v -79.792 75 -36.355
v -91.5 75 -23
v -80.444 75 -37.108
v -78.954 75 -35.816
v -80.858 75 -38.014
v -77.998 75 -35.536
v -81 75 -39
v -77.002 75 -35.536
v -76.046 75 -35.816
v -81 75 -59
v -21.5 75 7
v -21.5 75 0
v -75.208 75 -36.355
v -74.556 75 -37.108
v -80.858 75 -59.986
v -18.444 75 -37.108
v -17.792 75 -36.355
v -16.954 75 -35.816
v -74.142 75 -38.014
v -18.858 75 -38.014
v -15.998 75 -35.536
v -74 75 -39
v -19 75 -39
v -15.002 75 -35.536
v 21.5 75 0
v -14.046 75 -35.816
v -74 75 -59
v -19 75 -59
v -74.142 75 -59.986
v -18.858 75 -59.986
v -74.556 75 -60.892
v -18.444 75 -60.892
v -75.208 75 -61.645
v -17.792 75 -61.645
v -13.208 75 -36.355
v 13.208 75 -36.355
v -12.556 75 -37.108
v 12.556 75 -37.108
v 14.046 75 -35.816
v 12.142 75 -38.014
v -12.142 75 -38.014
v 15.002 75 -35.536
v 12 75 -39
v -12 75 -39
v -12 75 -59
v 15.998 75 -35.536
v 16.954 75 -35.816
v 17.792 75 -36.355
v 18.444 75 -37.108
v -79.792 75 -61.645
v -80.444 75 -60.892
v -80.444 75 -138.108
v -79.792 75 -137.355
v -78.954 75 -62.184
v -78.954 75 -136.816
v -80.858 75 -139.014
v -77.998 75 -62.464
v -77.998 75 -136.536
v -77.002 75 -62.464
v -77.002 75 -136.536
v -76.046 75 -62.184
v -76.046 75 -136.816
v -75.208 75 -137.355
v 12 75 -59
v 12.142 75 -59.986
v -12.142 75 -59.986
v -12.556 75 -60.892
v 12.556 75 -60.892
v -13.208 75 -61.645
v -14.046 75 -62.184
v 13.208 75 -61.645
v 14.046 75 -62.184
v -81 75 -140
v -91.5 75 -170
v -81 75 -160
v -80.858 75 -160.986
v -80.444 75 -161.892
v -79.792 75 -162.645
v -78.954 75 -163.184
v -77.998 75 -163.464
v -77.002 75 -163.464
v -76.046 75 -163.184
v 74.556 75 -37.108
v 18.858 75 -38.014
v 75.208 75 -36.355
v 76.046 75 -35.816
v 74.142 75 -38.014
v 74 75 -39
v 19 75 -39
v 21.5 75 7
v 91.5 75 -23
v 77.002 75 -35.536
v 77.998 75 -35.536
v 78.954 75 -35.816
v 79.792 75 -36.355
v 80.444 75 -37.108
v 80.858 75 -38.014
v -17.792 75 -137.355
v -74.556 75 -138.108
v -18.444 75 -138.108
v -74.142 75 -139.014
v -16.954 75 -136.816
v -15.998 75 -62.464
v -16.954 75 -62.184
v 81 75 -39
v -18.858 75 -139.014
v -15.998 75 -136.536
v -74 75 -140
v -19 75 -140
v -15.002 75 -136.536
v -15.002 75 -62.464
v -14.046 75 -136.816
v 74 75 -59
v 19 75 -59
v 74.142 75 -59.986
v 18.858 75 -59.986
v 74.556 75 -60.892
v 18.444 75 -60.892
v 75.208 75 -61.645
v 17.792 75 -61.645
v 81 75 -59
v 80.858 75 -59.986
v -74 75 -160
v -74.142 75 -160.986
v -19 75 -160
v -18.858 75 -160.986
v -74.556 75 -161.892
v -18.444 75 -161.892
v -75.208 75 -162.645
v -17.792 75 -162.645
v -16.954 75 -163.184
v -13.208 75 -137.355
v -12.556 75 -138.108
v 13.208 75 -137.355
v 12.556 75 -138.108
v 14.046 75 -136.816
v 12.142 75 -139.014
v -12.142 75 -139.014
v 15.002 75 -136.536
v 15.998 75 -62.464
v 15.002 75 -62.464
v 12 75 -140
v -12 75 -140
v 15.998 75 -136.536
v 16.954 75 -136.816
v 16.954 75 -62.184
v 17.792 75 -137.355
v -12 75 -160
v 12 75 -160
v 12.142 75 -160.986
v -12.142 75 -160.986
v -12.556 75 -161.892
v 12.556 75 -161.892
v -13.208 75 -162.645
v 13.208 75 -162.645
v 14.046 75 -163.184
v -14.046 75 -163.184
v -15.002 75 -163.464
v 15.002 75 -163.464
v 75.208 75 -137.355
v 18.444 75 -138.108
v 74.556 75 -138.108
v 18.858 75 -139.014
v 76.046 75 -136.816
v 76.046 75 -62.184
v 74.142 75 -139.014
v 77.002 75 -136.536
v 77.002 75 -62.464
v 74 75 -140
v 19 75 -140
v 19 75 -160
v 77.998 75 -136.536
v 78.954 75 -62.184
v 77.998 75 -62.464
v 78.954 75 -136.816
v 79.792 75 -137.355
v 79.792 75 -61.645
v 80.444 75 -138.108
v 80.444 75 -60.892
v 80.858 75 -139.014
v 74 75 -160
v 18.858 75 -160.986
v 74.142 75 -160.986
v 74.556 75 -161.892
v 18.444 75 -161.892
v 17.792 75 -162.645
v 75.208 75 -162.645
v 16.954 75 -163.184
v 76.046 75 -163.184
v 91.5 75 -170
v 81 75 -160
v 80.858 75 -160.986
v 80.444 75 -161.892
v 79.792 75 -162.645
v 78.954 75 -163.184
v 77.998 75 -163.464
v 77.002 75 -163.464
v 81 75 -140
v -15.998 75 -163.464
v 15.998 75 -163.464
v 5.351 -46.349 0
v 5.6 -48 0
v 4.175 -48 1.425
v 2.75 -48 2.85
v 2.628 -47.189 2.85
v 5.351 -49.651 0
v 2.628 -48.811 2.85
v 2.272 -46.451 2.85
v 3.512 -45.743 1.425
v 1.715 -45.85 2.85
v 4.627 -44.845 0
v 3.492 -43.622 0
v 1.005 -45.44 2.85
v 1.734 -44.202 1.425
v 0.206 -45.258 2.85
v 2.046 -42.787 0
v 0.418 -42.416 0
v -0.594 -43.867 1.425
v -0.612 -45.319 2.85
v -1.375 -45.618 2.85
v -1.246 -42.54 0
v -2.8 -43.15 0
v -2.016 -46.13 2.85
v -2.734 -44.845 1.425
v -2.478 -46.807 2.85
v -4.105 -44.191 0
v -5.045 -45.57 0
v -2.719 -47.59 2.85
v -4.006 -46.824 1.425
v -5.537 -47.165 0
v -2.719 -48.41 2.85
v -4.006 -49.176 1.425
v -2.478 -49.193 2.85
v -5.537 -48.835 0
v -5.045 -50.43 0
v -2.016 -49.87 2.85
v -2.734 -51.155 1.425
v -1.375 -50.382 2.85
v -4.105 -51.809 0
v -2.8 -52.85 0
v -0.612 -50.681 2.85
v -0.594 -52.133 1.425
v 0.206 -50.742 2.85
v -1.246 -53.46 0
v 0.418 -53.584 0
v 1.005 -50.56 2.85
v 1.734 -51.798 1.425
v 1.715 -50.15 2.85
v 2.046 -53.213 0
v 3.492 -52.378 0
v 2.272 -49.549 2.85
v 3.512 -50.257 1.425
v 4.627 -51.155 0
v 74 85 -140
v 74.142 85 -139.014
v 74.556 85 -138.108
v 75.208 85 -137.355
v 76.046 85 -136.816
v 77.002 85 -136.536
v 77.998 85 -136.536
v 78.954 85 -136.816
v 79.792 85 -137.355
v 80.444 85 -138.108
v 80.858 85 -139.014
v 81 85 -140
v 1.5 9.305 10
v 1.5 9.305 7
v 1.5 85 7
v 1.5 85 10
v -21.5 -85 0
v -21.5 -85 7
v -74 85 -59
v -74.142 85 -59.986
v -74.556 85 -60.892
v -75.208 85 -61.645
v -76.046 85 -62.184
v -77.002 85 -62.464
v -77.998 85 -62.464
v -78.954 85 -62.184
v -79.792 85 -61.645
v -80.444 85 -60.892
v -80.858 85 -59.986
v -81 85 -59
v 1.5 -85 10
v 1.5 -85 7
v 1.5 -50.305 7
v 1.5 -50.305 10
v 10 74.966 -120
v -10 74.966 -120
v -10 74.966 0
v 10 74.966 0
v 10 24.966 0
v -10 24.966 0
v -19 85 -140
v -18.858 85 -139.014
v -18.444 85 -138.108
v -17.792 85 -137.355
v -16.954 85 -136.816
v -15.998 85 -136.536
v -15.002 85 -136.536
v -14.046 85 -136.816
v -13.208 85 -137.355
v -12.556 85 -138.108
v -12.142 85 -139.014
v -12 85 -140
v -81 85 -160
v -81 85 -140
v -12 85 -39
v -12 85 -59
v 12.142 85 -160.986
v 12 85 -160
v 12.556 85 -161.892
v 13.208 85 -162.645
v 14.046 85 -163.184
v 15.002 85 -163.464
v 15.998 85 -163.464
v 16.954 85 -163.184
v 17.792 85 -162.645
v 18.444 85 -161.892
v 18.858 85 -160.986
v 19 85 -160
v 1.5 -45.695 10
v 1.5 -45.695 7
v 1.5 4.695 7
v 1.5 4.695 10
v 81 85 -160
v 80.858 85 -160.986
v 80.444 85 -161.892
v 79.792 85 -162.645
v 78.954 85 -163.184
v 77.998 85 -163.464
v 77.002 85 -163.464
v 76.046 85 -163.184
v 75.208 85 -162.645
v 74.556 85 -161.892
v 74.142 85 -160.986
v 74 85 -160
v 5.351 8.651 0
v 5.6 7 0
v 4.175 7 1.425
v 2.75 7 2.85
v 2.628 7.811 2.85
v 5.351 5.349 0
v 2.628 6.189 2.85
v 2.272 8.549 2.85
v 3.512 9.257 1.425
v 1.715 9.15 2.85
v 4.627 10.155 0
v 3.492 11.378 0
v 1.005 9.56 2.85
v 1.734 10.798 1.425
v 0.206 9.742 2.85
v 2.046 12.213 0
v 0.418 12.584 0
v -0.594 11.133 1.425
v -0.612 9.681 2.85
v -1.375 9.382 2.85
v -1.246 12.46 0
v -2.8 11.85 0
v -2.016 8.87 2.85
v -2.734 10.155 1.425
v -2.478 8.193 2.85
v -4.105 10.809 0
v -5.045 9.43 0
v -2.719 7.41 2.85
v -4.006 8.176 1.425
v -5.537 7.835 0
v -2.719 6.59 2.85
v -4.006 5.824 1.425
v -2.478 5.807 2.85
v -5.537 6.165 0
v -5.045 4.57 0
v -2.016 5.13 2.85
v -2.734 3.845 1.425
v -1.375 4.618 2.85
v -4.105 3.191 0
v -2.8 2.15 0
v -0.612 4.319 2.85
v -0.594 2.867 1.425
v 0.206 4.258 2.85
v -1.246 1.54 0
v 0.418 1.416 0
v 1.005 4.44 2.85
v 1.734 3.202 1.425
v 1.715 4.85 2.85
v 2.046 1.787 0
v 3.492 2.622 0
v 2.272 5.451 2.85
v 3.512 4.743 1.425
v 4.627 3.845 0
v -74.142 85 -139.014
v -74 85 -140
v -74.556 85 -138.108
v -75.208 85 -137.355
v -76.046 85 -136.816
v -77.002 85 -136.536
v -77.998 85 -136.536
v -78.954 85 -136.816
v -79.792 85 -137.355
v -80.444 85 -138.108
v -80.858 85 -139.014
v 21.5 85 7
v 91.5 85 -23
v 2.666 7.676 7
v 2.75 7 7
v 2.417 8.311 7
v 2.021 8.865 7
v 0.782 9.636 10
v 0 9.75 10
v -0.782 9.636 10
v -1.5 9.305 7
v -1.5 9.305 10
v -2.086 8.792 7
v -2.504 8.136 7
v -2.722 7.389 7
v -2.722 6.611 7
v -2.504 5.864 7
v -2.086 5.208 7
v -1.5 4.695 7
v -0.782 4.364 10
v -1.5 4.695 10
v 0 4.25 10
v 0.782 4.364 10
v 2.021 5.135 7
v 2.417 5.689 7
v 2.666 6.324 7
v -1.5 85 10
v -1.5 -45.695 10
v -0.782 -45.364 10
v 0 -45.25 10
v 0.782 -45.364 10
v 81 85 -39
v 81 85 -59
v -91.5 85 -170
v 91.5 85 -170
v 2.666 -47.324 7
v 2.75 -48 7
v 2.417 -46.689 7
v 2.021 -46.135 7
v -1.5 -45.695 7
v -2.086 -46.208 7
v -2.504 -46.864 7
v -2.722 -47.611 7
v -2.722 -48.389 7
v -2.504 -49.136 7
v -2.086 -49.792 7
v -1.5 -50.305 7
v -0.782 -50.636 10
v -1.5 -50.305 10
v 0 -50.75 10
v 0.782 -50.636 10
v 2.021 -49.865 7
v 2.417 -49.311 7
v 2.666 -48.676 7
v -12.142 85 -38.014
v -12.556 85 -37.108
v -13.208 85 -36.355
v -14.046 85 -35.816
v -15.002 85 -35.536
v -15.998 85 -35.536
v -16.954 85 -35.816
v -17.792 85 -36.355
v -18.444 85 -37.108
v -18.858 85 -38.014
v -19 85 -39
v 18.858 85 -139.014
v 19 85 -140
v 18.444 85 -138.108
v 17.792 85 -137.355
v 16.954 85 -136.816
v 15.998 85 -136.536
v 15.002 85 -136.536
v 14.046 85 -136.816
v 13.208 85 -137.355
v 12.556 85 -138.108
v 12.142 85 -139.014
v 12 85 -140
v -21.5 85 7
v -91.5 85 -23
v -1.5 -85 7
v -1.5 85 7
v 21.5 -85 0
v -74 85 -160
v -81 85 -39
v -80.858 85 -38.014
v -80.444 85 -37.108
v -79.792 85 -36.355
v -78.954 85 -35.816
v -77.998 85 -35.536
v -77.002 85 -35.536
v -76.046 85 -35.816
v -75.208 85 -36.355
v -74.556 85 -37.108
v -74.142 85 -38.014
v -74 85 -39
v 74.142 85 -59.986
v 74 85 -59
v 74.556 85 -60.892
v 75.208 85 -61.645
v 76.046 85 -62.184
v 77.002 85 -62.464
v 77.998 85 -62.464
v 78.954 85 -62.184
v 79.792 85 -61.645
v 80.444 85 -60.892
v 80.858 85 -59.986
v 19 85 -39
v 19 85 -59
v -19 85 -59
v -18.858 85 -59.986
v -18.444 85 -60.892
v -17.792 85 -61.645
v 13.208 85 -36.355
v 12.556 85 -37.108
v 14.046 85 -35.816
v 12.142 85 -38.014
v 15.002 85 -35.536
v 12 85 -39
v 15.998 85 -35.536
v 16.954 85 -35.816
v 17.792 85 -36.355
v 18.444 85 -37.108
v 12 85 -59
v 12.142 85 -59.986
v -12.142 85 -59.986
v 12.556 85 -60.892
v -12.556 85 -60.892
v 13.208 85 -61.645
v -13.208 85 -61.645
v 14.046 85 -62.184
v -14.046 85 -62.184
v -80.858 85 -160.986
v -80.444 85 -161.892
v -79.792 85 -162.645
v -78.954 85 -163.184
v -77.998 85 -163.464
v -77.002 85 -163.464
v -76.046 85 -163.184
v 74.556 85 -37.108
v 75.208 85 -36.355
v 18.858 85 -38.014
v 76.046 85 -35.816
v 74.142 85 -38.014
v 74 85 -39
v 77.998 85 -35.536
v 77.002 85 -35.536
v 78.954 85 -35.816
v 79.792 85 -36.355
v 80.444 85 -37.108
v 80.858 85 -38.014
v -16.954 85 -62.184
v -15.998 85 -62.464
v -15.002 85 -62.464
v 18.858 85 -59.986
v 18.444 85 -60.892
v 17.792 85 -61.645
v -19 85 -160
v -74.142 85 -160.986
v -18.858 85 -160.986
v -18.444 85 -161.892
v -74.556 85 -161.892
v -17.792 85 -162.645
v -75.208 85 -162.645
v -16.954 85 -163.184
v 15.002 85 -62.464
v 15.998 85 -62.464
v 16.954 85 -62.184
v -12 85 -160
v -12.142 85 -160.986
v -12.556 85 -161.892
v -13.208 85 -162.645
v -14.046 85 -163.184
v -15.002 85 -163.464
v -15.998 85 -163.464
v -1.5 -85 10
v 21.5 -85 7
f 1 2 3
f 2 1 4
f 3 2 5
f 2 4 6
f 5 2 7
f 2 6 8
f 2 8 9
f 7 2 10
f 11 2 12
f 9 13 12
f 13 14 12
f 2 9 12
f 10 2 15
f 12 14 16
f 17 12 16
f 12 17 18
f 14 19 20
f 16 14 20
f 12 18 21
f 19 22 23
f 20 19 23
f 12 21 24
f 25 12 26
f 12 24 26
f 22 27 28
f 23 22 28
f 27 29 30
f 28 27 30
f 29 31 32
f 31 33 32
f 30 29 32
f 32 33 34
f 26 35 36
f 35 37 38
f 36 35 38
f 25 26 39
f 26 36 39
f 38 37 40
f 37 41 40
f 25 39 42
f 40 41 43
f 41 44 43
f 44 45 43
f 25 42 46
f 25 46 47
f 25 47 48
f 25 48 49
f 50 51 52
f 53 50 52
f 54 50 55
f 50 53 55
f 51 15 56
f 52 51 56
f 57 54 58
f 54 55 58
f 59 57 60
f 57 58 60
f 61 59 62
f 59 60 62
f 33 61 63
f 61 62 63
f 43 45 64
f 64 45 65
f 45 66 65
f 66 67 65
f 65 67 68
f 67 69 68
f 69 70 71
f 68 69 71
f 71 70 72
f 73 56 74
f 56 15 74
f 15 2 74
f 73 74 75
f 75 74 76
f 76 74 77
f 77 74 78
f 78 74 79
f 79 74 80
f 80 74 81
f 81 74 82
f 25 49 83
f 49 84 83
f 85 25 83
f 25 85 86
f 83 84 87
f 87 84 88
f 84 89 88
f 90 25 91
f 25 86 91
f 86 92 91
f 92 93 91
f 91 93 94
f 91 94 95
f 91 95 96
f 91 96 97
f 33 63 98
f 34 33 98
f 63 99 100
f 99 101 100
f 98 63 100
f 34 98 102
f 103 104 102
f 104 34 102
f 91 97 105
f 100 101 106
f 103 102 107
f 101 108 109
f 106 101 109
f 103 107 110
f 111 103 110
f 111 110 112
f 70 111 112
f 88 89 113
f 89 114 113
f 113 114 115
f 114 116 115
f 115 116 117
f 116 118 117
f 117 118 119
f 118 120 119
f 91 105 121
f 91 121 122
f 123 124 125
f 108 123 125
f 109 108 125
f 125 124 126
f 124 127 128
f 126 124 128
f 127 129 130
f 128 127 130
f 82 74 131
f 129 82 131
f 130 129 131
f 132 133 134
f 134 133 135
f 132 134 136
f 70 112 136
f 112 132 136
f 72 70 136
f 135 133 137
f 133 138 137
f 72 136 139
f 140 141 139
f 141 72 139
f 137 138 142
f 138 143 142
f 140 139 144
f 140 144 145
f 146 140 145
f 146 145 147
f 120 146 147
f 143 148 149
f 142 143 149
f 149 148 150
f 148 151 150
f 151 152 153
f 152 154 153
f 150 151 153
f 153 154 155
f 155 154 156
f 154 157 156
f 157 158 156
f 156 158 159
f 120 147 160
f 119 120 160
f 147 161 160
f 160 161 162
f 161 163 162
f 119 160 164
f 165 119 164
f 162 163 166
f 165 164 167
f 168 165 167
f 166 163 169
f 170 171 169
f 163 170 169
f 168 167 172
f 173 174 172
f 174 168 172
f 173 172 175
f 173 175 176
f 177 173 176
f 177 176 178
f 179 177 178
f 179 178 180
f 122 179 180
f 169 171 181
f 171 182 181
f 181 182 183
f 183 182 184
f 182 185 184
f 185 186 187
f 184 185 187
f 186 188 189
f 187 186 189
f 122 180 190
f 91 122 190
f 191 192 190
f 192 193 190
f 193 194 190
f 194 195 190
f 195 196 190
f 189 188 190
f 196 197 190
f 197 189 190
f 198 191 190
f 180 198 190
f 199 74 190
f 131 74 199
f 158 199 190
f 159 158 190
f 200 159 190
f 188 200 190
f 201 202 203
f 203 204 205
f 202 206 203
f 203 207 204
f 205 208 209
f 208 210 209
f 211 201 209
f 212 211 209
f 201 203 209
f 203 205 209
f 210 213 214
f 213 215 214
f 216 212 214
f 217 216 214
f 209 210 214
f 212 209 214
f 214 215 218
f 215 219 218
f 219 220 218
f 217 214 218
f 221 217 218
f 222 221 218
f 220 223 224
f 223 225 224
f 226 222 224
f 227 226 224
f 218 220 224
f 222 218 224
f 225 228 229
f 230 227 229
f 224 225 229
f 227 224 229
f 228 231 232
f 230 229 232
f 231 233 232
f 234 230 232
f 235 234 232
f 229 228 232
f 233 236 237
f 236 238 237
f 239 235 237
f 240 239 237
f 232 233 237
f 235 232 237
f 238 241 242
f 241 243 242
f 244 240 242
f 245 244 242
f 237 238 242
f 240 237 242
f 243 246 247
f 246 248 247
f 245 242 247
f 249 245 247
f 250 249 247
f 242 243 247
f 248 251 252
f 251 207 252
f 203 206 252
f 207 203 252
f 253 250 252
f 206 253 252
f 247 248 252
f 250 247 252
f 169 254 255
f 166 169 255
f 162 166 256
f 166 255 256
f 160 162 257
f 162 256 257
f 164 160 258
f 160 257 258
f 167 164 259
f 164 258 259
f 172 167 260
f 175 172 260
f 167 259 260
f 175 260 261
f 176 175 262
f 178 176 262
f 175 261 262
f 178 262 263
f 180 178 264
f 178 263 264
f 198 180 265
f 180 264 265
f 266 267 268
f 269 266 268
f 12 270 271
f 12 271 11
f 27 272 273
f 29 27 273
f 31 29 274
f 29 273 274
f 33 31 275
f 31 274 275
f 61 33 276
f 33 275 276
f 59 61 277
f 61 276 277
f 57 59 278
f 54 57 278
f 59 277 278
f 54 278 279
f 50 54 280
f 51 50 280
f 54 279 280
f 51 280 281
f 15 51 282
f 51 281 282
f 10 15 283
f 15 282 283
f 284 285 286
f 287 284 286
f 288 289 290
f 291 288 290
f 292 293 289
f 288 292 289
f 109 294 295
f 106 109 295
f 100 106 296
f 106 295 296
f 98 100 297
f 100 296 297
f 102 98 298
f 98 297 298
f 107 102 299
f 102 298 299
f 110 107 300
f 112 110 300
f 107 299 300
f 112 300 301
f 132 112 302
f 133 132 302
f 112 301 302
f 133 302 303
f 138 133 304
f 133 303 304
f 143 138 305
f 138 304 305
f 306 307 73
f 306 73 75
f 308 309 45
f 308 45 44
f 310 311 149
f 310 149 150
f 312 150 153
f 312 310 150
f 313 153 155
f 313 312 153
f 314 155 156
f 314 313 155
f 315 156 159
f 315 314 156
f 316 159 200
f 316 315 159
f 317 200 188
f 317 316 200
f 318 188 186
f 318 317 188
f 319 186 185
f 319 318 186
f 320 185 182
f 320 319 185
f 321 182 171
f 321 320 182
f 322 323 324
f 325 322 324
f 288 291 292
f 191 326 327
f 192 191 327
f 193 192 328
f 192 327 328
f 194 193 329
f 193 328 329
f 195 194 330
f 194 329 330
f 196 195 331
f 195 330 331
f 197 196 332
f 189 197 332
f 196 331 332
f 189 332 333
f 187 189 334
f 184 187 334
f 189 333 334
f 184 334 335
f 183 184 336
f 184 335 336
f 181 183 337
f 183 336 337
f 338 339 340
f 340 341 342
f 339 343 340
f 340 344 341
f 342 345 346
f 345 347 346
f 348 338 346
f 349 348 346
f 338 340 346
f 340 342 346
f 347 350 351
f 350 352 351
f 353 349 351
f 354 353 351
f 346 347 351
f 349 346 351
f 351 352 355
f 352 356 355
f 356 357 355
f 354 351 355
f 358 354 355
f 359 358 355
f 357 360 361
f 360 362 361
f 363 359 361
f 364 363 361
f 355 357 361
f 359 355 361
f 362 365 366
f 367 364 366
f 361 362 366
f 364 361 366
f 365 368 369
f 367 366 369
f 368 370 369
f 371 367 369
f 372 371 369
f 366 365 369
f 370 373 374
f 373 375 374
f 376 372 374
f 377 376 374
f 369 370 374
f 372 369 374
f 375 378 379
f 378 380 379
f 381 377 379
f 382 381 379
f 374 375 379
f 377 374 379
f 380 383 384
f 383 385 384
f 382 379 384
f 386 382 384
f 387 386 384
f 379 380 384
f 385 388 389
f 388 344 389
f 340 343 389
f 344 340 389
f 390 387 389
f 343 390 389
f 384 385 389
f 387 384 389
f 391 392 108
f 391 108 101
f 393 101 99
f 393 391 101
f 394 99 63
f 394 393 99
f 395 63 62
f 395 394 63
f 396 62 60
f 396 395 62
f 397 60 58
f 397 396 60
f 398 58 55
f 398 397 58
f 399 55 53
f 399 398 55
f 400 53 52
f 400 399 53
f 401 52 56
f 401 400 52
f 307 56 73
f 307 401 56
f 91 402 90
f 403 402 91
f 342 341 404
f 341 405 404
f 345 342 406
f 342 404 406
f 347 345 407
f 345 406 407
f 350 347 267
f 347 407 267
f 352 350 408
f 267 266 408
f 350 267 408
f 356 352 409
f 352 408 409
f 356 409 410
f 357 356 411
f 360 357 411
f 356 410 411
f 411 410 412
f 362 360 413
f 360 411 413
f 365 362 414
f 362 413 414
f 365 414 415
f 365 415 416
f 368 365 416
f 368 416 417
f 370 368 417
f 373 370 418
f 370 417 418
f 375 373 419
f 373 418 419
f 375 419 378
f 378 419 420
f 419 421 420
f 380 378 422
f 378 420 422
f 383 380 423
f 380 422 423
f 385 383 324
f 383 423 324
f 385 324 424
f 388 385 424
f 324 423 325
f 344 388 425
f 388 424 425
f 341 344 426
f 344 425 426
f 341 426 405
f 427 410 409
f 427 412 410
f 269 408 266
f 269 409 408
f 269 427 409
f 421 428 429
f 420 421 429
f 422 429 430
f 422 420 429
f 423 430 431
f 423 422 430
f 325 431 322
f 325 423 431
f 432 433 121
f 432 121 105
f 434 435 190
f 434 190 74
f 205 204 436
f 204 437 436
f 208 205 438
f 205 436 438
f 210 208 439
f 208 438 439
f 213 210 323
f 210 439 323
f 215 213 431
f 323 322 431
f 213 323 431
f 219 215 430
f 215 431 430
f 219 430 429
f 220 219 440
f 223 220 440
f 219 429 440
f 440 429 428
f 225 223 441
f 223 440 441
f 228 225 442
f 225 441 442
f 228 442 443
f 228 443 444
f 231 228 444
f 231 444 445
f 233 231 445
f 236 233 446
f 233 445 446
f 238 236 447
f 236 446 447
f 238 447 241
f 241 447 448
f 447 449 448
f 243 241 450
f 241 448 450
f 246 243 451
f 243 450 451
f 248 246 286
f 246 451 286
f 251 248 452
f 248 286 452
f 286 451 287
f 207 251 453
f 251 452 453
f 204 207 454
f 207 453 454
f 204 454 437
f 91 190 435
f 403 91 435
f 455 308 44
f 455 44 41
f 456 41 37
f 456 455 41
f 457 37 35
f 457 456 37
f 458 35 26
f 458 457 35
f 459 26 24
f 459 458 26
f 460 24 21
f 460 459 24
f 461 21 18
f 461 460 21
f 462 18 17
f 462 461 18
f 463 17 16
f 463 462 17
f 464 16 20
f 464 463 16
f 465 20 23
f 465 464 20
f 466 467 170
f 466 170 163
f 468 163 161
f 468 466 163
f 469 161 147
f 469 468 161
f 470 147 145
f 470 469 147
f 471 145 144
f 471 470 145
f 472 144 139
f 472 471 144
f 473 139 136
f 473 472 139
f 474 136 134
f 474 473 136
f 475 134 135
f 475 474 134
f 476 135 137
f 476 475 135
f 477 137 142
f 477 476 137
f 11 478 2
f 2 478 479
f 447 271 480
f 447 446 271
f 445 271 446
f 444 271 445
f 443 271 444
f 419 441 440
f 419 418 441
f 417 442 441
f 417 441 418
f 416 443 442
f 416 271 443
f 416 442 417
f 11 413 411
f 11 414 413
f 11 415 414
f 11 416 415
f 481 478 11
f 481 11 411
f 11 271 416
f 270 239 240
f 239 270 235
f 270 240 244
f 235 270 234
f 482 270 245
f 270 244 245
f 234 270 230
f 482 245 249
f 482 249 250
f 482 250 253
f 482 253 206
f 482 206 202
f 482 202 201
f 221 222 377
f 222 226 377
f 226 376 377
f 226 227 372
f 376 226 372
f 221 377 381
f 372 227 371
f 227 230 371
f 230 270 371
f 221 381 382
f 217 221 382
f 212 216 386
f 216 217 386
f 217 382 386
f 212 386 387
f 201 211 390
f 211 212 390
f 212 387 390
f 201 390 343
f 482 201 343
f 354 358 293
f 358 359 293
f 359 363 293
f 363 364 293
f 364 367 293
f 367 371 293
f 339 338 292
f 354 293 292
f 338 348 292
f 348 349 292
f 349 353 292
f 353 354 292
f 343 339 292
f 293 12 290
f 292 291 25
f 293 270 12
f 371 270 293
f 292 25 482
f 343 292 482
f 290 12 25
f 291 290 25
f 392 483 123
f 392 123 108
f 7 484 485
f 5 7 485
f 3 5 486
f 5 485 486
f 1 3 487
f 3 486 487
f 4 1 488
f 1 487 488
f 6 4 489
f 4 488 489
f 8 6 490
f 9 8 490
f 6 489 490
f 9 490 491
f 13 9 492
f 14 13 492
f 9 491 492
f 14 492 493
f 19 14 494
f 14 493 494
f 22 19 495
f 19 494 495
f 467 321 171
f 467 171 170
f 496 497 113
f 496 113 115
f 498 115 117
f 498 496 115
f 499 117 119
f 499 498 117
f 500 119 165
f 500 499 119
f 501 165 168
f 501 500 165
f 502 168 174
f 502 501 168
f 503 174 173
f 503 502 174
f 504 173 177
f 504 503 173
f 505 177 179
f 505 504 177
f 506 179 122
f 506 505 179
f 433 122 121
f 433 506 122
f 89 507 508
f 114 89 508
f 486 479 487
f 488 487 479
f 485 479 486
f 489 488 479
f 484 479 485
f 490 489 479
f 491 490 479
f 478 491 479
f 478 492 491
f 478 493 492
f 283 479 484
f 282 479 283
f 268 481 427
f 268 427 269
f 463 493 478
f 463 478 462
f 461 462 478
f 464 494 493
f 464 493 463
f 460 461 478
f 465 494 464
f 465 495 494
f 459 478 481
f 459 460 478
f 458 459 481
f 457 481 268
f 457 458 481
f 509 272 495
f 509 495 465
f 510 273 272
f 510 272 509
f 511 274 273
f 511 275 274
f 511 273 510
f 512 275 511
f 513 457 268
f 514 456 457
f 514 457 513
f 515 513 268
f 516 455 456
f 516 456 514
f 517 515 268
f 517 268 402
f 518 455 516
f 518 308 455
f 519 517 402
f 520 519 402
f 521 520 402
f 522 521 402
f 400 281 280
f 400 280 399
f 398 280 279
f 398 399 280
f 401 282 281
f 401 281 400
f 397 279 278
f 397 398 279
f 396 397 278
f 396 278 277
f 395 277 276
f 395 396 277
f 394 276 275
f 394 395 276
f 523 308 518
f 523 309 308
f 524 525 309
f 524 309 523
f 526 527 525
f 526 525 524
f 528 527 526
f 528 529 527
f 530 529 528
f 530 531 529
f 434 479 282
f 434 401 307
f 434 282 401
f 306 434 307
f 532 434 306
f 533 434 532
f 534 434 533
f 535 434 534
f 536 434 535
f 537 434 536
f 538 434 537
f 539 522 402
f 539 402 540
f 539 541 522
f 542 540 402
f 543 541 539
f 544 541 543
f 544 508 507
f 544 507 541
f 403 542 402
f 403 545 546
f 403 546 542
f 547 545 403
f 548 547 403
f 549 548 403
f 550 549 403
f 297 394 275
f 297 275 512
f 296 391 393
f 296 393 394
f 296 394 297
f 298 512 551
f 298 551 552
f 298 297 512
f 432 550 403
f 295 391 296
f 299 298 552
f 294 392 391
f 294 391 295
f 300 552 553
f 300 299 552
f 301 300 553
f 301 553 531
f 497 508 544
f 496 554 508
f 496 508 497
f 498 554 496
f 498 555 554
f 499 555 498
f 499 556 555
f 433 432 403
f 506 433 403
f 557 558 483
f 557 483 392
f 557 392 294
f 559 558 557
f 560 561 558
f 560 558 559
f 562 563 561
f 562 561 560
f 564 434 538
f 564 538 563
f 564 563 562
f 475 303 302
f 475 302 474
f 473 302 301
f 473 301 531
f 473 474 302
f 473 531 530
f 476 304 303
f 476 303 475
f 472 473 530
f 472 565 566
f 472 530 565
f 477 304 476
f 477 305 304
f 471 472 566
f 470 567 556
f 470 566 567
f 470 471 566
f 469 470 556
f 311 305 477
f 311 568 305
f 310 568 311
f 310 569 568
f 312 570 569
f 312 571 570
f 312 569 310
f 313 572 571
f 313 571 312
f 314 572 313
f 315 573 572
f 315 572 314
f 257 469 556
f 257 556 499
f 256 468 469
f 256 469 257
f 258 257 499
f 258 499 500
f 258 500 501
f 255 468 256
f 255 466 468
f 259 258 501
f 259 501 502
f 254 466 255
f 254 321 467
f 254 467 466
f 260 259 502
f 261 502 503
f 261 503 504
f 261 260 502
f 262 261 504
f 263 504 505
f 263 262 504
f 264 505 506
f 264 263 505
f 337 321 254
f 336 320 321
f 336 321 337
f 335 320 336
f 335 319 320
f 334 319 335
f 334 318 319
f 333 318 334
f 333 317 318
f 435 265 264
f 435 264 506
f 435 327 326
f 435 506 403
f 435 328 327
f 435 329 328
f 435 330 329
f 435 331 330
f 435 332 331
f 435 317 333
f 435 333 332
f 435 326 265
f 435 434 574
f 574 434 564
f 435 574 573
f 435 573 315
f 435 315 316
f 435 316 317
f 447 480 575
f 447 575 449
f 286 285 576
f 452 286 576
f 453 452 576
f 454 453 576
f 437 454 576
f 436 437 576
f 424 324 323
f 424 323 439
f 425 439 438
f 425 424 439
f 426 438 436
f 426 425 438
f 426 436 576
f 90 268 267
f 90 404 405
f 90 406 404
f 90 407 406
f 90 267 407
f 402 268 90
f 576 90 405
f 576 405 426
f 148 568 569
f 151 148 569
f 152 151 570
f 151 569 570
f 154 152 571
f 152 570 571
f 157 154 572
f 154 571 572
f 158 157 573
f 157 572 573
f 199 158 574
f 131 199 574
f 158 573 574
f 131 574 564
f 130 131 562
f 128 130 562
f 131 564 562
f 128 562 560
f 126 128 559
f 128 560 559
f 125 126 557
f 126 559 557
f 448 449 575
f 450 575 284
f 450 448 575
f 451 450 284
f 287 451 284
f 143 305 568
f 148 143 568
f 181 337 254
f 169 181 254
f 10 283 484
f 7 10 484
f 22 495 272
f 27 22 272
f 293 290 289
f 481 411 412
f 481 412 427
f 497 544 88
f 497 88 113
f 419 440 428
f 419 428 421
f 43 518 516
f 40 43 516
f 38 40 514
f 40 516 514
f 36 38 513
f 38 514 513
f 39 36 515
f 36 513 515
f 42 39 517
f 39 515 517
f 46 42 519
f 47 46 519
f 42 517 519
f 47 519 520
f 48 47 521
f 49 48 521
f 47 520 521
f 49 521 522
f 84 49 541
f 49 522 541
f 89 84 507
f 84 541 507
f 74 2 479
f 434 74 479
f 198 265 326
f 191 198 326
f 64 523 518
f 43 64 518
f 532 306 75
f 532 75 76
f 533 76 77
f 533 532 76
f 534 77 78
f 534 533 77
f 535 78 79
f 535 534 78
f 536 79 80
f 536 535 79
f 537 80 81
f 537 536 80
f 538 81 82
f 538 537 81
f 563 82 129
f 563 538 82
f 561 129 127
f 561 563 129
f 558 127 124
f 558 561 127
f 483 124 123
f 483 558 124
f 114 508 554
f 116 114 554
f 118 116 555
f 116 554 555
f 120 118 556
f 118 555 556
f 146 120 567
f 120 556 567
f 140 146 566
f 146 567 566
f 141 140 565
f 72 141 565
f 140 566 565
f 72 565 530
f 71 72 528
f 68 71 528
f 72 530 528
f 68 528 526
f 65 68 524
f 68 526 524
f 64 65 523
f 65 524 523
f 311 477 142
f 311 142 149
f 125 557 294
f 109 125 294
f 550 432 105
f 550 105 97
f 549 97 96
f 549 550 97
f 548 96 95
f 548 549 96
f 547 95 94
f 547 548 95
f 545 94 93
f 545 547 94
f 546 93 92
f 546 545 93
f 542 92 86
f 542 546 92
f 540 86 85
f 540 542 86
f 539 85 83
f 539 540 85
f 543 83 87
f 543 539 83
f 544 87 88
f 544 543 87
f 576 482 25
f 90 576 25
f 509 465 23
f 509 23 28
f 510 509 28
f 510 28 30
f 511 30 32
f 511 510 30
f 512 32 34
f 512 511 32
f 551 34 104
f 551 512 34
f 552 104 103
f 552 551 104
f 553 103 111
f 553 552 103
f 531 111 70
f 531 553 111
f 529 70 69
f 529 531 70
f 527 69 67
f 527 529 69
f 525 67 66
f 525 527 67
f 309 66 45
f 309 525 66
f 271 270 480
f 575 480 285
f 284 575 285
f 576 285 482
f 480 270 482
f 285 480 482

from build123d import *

# Parameters (mm, degrees)
SKETCH_1_W                   = 43
SKETCH_1_H                   = 170
EXTRUDE_296_DEPTH            = 7
SKETCH_2_W                   = 3
SKETCH_2_H                   = 170
EXTRUDE_513_DEPTH            = 3
HOLE_WIZARD_M5_2_D           = 5.5
HOLE_WIZARD_M5_2_CSINK_D     = 11.2
HOLE_WIZARD_M5_2_CSINK_ANGLE = 90
SKETCH_9_W                   = 183
SKETCH_9_H                   = 10
EXTRUDE_1613_DEPTH           = 170
SKETCH_10_W                  = 183
SKETCH_10_H                  = 10
EXTRUDE_1772_DEPTH           = 7
EXTRUDE_3_DEPTH              = 10
EXTRUDE_3_DEPTH_BACK         = 10
CUT_EXTRUDE_1_DEPTH          = 258.239674234
MIRROR_2_COPY_1_DEPTH        = 258.239674234
CUT_EXTRUDE_2_DEPTH          = 10
MIRROR_3_COPY_1_DEPTH        = 258.239674234
MIRROR_3_COPY_2_DEPTH        = 258.239674234
MIRROR_3_COPY_3_DEPTH        = 258.239674234


with BuildPart() as part:
    # 草图1 → Extrude 296 (new body)
    with BuildSketch(Plane.XY):
        Rectangle(SKETCH_1_W, SKETCH_1_H)
    extrude(amount=EXTRUDE_296_DEPTH)

    # 草图2 → Extrude 513 (add)
    with BuildSketch(Plane.XY.offset(7)):
        Rectangle(SKETCH_2_W, SKETCH_2_H)
    extrude(amount=EXTRUDE_513_DEPTH)

    # M5*2 沉头孔 (through all)
    with Locations(Plane(origin=(0, 0, 0), x_dir=(-1, 0, 0), z_dir=(0, 0, -1))):
        with Locations((0, 7), (0, -48)):
            CounterSinkHole(HOLE_WIZARD_M5_2_D / 2, HOLE_WIZARD_M5_2_CSINK_D / 2, counter_sink_angle=HOLE_WIZARD_M5_2_CSINK_ANGLE)

    # 草图9 → Extrude 1613 (add)
    with BuildSketch(Plane(origin=(0, 0, 0), x_dir=(-1, 0, 0), z_dir=(0, 0, -1))):
        with Locations((0, 80)):
            Rectangle(SKETCH_9_W, SKETCH_9_H)
    extrude(amount=EXTRUDE_1613_DEPTH)

    # 草图10 → Extrude 1772 (add)
    with BuildSketch(Plane.XY):
        with Locations((0, 80)):
            Rectangle(SKETCH_10_W, SKETCH_10_H)
    extrude(amount=EXTRUDE_1772_DEPTH)

    # 草图11 → 凸台-拉伸3 (add, two sides: drawn at the far end of the back side and taken through both)
    with BuildSketch(Plane(origin=(0, 0, 0), x_dir=(0, 0, -1), z_dir=(1, 0, 0)).offset(-EXTRUDE_3_DEPTH_BACK)):
        Polygon((0, 74.965878979), (0, 24.965878979), (120, 74.965878979), align=None)
    extrude(amount=EXTRUDE_3_DEPTH + EXTRUDE_3_DEPTH_BACK)

    # 草图12 → 切除-拉伸1 (cut, through all)
    with BuildSketch(Plane(origin=(0, 85, 0), x_dir=(1, 0, 0), z_dir=(0, 1, 0))):
        with BuildLine():
            Line((-74, 160), (-74, 140))
            ThreePointArc((-74, 140), (-77.5, 136.5), (-81, 140))
            Line((-81, 140), (-81, 160))
            ThreePointArc((-81, 160), (-77.5, 163.5), (-74, 160))
        make_face()
    cut_extrude_1 = extrude(amount=-CUT_EXTRUDE_1_DEPTH, mode=Mode.SUBTRACT)

    # 镜向1: 切除-拉伸1 across plane
    add(cut_extrude_1.mirror(Plane.XY.offset(-99.5)), mode=Mode.SUBTRACT)

    # 镜向2: 切除-拉伸1 across plane
    add(cut_extrude_1.mirror(Plane.ZY.offset(46.5)), mode=Mode.SUBTRACT)

    # 镜向2 copy 1 sketch → 镜向2 copy 1 (cut, through all)
    with BuildSketch(Plane(origin=(-93, 85, -199), x_dir=(-1, 0, 0), z_dir=(0, 1, 0))):
        with BuildLine():
            Line((-74, 160), (-74, 140))
            ThreePointArc((-74, 140), (-77.5, 136.5), (-81, 140))
            Line((-81, 140), (-81, 160))
            ThreePointArc((-81, 160), (-77.5, 163.5), (-74, 160))
        make_face()
    extrude(amount=-MIRROR_2_COPY_1_DEPTH, mode=Mode.SUBTRACT)

    # 草图13 → 切除-拉伸2 (cut)
    with BuildSketch(Plane(origin=(0, 85, 0), x_dir=(1, 0, 0), z_dir=(0, 1, 0))):
        Polygon((-91.5, -7), (-21.5, -7), (-91.5, 23), align=None)
    cut_extrude_2 = extrude(amount=-CUT_EXTRUDE_2_DEPTH, mode=Mode.SUBTRACT)

    # 镜向3: 切除-拉伸1, 切除-拉伸2 across plane
    add(cut_extrude_1.mirror(Plane(origin=(0, 0, 0), x_dir=(0, 0, 1), z_dir=(1, 0, 0))), mode=Mode.SUBTRACT)
    add(cut_extrude_2.mirror(Plane(origin=(0, 0, 0), x_dir=(0, 0, 1), z_dir=(1, 0, 0))), mode=Mode.SUBTRACT)

    # 镜向3 copy 1 sketch → 镜向3 copy 1 (cut, through all)
    with BuildSketch(Plane(origin=(0, 85, -199), x_dir=(-1, 0, 0), z_dir=(0, 1, 0))):
        with BuildLine():
            Line((-74, 160), (-74, 140))
            ThreePointArc((-74, 140), (-77.5, 136.5), (-81, 140))
            Line((-81, 140), (-81, 160))
            ThreePointArc((-81, 160), (-77.5, 163.5), (-74, 160))
        make_face()
    extrude(amount=-MIRROR_3_COPY_1_DEPTH, mode=Mode.SUBTRACT)

    # 镜向3 copy 2 sketch → 镜向3 copy 2 (cut, through all)
    with BuildSketch(Plane(origin=(93, 85, 0), x_dir=(1, 0, 0), z_dir=(0, 1, 0))):
        with BuildLine():
            Line((-74, 160), (-74, 140))
            ThreePointArc((-74, 140), (-77.5, 136.5), (-81, 140))
            Line((-81, 140), (-81, 160))
            ThreePointArc((-81, 160), (-77.5, 163.5), (-74, 160))
        make_face()
    extrude(amount=-MIRROR_3_COPY_2_DEPTH, mode=Mode.SUBTRACT)

    # 镜向3 copy 3 sketch → 镜向3 copy 3 (cut, through all)
    with BuildSketch(Plane(origin=(93, 85, -199), x_dir=(1, 0, 0), z_dir=(0, 1, 0))):
        with BuildLine():
            Line((-74, -160), (-74, -140))
            ThreePointArc((-74, -140), (-77.5, -136.5), (-81, -140))
            Line((-81, -140), (-81, -160))
            ThreePointArc((-81, -160), (-77.5, -163.5), (-74, -160))
        make_face()
    extrude(amount=-MIRROR_3_COPY_3_DEPTH, mode=Mode.SUBTRACT)


solid = part.part
